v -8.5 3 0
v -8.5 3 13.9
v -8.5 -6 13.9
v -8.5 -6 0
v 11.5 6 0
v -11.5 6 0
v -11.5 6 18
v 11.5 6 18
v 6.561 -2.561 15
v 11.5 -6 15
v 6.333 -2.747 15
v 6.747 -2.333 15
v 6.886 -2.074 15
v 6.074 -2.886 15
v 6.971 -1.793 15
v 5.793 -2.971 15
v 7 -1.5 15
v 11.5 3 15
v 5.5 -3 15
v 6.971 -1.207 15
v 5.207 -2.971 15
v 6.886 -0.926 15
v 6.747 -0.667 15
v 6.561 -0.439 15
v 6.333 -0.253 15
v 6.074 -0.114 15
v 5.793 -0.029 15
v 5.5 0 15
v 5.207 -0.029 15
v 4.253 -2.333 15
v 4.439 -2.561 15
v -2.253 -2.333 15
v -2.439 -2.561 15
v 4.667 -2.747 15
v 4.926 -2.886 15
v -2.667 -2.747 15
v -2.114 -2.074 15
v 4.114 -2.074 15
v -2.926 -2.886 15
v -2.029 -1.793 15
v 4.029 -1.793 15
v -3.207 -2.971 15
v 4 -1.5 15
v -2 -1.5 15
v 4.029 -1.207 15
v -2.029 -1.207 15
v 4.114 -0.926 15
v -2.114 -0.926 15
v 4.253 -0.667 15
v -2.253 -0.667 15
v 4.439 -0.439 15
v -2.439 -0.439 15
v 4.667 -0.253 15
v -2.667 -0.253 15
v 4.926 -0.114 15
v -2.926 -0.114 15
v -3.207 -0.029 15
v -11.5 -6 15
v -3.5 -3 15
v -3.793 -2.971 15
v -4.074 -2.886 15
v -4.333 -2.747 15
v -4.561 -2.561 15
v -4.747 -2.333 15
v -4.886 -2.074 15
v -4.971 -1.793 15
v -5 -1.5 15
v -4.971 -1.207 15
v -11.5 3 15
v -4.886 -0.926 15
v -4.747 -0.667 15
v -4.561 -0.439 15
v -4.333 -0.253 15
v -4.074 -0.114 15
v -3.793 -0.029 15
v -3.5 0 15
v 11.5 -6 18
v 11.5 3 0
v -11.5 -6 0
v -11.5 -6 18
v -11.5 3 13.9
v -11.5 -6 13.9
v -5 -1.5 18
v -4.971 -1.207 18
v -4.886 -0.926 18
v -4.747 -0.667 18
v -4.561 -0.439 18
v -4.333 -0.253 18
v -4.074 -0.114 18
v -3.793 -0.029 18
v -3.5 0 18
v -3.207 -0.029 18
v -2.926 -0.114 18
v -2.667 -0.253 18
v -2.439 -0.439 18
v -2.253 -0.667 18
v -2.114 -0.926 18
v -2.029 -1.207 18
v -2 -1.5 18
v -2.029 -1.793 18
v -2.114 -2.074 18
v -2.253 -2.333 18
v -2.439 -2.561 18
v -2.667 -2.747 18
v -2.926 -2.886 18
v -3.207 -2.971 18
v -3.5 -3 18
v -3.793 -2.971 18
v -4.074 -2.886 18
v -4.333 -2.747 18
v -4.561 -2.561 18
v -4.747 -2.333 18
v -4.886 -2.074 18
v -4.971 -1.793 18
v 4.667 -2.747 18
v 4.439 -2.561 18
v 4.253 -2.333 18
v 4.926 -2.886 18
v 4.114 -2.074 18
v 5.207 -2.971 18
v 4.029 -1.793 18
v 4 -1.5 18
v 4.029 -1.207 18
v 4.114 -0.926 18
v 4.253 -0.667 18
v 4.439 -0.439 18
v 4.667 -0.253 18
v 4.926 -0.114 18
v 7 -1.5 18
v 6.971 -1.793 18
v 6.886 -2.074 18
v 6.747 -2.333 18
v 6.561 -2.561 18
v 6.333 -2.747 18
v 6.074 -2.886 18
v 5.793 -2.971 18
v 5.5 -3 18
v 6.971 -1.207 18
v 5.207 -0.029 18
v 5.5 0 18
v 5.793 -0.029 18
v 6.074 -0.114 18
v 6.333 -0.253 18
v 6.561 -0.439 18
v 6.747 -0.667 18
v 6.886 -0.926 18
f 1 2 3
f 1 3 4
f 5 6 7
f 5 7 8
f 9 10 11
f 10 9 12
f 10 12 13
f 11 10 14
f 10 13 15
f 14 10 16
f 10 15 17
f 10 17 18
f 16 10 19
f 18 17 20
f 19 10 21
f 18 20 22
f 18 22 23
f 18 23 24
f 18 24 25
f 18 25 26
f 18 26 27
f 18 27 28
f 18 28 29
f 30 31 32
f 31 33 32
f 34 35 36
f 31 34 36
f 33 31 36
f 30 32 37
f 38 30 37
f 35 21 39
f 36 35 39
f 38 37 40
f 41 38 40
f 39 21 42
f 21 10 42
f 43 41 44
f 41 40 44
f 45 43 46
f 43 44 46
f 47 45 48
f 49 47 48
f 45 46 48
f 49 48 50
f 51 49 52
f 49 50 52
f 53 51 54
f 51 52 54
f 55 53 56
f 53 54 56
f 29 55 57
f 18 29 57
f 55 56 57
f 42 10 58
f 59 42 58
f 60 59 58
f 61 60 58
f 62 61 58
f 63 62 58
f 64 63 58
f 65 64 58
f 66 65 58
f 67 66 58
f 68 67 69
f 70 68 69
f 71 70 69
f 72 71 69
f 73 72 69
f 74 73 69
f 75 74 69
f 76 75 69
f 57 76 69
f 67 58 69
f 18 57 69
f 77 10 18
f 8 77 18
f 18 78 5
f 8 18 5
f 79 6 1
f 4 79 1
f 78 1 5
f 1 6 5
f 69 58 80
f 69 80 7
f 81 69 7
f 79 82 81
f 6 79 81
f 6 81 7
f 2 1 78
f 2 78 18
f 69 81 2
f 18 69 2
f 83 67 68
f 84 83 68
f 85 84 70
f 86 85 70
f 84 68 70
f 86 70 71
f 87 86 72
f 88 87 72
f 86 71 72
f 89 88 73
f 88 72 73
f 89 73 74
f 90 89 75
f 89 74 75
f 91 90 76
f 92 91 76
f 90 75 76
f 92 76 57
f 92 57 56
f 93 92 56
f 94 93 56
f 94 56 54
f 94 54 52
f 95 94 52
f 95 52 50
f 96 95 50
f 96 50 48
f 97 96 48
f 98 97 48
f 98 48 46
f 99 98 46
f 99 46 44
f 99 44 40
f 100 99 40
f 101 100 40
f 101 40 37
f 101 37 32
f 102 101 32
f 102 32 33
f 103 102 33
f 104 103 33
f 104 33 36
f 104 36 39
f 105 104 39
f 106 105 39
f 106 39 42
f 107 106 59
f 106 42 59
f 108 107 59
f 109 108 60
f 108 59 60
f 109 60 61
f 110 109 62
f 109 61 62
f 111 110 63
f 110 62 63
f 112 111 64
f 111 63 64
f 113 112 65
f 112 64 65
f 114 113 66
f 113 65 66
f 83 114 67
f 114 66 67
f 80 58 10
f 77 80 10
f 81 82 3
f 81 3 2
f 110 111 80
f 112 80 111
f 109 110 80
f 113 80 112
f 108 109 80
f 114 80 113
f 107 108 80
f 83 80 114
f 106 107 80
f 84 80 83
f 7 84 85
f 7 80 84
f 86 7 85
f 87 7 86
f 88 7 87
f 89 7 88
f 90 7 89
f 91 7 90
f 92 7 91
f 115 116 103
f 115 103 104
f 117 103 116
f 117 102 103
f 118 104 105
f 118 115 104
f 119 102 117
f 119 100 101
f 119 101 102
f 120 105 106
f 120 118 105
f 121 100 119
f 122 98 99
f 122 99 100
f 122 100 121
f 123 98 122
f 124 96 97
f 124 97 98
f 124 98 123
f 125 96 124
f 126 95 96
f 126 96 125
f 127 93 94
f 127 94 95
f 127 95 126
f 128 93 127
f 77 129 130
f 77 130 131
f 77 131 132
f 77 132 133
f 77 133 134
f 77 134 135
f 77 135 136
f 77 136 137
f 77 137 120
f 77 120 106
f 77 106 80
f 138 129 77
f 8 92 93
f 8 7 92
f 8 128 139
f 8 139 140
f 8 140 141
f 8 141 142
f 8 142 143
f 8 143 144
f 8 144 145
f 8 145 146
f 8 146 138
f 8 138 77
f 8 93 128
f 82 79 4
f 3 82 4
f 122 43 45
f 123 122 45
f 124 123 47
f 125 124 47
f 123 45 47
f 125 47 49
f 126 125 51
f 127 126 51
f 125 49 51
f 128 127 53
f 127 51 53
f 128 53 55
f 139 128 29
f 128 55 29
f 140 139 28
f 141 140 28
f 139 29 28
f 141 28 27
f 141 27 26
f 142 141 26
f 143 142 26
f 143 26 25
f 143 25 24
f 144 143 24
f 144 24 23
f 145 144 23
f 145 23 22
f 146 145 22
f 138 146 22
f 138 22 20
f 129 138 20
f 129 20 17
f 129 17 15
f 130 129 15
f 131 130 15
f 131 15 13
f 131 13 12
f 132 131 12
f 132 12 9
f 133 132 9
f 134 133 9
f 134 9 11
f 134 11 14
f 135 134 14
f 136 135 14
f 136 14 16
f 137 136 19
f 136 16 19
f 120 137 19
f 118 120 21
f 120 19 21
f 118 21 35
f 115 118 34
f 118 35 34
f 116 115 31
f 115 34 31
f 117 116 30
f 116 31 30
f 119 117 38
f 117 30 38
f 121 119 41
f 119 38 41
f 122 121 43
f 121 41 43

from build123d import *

# Parameters (mm, degrees)
CROQUIS1_W              = 23
CROQUIS1_H              = 12
SALIENTE_EXTRUIR1_DEPTH = 18
CROQUIS2_W              = 15
CROQUIS2_H              = 9
CORTAR_EXTRUIR1_DEPTH   = 20
CROQUIS3_W              = 1.1
CROQUIS3_H              = 9
CORTAR_EXTRUIR2_DEPTH   = 24
CROQUIS4_R              = 1.5
CORTAR_EXTRUIR3_DEPTH   = 4


with BuildPart() as part:
    # Croquis1 → Saliente-Extruir1 (new body)
    with BuildSketch(Plane.XY):
        Rectangle(CROQUIS1_W, CROQUIS1_H)
    extrude(amount=SALIENTE_EXTRUIR1_DEPTH)

    # Croquis2 → Cortar-Extruir1 (cut)
    with BuildSketch(Plane(origin=(11.5, 0, 0), x_dir=(0, 0, -1), z_dir=(1, 0, 0))):
        with Locations((-7.5, -1.5)):
            Rectangle(CROQUIS2_W, CROQUIS2_H)
    extrude(amount=-CORTAR_EXTRUIR1_DEPTH, mode=Mode.SUBTRACT)

    # Croquis3 → Cortar-Extruir2 (cut, through all)
    with BuildSketch(Plane.ZY.offset(11.5)):
        with Locations((14.45, -1.5)):
            Rectangle(CROQUIS3_W, CROQUIS3_H)
    extrude(amount=-CORTAR_EXTRUIR2_DEPTH, mode=Mode.SUBTRACT)

    # Croquis4 → Cortar-Extruir3 (cut, through all)
    with BuildSketch(Plane(origin=(0, 0, 15), x_dir=(-1, 0, 0), z_dir=(0, 0, -1))):
        with Locations((-5.5, -1.5)):
            Circle(CROQUIS4_R)
        with Locations((3.5, -1.5)):
            Circle(CROQUIS4_R)
    extrude(amount=-CORTAR_EXTRUIR3_DEPTH, mode=Mode.SUBTRACT)


solid = part.part
